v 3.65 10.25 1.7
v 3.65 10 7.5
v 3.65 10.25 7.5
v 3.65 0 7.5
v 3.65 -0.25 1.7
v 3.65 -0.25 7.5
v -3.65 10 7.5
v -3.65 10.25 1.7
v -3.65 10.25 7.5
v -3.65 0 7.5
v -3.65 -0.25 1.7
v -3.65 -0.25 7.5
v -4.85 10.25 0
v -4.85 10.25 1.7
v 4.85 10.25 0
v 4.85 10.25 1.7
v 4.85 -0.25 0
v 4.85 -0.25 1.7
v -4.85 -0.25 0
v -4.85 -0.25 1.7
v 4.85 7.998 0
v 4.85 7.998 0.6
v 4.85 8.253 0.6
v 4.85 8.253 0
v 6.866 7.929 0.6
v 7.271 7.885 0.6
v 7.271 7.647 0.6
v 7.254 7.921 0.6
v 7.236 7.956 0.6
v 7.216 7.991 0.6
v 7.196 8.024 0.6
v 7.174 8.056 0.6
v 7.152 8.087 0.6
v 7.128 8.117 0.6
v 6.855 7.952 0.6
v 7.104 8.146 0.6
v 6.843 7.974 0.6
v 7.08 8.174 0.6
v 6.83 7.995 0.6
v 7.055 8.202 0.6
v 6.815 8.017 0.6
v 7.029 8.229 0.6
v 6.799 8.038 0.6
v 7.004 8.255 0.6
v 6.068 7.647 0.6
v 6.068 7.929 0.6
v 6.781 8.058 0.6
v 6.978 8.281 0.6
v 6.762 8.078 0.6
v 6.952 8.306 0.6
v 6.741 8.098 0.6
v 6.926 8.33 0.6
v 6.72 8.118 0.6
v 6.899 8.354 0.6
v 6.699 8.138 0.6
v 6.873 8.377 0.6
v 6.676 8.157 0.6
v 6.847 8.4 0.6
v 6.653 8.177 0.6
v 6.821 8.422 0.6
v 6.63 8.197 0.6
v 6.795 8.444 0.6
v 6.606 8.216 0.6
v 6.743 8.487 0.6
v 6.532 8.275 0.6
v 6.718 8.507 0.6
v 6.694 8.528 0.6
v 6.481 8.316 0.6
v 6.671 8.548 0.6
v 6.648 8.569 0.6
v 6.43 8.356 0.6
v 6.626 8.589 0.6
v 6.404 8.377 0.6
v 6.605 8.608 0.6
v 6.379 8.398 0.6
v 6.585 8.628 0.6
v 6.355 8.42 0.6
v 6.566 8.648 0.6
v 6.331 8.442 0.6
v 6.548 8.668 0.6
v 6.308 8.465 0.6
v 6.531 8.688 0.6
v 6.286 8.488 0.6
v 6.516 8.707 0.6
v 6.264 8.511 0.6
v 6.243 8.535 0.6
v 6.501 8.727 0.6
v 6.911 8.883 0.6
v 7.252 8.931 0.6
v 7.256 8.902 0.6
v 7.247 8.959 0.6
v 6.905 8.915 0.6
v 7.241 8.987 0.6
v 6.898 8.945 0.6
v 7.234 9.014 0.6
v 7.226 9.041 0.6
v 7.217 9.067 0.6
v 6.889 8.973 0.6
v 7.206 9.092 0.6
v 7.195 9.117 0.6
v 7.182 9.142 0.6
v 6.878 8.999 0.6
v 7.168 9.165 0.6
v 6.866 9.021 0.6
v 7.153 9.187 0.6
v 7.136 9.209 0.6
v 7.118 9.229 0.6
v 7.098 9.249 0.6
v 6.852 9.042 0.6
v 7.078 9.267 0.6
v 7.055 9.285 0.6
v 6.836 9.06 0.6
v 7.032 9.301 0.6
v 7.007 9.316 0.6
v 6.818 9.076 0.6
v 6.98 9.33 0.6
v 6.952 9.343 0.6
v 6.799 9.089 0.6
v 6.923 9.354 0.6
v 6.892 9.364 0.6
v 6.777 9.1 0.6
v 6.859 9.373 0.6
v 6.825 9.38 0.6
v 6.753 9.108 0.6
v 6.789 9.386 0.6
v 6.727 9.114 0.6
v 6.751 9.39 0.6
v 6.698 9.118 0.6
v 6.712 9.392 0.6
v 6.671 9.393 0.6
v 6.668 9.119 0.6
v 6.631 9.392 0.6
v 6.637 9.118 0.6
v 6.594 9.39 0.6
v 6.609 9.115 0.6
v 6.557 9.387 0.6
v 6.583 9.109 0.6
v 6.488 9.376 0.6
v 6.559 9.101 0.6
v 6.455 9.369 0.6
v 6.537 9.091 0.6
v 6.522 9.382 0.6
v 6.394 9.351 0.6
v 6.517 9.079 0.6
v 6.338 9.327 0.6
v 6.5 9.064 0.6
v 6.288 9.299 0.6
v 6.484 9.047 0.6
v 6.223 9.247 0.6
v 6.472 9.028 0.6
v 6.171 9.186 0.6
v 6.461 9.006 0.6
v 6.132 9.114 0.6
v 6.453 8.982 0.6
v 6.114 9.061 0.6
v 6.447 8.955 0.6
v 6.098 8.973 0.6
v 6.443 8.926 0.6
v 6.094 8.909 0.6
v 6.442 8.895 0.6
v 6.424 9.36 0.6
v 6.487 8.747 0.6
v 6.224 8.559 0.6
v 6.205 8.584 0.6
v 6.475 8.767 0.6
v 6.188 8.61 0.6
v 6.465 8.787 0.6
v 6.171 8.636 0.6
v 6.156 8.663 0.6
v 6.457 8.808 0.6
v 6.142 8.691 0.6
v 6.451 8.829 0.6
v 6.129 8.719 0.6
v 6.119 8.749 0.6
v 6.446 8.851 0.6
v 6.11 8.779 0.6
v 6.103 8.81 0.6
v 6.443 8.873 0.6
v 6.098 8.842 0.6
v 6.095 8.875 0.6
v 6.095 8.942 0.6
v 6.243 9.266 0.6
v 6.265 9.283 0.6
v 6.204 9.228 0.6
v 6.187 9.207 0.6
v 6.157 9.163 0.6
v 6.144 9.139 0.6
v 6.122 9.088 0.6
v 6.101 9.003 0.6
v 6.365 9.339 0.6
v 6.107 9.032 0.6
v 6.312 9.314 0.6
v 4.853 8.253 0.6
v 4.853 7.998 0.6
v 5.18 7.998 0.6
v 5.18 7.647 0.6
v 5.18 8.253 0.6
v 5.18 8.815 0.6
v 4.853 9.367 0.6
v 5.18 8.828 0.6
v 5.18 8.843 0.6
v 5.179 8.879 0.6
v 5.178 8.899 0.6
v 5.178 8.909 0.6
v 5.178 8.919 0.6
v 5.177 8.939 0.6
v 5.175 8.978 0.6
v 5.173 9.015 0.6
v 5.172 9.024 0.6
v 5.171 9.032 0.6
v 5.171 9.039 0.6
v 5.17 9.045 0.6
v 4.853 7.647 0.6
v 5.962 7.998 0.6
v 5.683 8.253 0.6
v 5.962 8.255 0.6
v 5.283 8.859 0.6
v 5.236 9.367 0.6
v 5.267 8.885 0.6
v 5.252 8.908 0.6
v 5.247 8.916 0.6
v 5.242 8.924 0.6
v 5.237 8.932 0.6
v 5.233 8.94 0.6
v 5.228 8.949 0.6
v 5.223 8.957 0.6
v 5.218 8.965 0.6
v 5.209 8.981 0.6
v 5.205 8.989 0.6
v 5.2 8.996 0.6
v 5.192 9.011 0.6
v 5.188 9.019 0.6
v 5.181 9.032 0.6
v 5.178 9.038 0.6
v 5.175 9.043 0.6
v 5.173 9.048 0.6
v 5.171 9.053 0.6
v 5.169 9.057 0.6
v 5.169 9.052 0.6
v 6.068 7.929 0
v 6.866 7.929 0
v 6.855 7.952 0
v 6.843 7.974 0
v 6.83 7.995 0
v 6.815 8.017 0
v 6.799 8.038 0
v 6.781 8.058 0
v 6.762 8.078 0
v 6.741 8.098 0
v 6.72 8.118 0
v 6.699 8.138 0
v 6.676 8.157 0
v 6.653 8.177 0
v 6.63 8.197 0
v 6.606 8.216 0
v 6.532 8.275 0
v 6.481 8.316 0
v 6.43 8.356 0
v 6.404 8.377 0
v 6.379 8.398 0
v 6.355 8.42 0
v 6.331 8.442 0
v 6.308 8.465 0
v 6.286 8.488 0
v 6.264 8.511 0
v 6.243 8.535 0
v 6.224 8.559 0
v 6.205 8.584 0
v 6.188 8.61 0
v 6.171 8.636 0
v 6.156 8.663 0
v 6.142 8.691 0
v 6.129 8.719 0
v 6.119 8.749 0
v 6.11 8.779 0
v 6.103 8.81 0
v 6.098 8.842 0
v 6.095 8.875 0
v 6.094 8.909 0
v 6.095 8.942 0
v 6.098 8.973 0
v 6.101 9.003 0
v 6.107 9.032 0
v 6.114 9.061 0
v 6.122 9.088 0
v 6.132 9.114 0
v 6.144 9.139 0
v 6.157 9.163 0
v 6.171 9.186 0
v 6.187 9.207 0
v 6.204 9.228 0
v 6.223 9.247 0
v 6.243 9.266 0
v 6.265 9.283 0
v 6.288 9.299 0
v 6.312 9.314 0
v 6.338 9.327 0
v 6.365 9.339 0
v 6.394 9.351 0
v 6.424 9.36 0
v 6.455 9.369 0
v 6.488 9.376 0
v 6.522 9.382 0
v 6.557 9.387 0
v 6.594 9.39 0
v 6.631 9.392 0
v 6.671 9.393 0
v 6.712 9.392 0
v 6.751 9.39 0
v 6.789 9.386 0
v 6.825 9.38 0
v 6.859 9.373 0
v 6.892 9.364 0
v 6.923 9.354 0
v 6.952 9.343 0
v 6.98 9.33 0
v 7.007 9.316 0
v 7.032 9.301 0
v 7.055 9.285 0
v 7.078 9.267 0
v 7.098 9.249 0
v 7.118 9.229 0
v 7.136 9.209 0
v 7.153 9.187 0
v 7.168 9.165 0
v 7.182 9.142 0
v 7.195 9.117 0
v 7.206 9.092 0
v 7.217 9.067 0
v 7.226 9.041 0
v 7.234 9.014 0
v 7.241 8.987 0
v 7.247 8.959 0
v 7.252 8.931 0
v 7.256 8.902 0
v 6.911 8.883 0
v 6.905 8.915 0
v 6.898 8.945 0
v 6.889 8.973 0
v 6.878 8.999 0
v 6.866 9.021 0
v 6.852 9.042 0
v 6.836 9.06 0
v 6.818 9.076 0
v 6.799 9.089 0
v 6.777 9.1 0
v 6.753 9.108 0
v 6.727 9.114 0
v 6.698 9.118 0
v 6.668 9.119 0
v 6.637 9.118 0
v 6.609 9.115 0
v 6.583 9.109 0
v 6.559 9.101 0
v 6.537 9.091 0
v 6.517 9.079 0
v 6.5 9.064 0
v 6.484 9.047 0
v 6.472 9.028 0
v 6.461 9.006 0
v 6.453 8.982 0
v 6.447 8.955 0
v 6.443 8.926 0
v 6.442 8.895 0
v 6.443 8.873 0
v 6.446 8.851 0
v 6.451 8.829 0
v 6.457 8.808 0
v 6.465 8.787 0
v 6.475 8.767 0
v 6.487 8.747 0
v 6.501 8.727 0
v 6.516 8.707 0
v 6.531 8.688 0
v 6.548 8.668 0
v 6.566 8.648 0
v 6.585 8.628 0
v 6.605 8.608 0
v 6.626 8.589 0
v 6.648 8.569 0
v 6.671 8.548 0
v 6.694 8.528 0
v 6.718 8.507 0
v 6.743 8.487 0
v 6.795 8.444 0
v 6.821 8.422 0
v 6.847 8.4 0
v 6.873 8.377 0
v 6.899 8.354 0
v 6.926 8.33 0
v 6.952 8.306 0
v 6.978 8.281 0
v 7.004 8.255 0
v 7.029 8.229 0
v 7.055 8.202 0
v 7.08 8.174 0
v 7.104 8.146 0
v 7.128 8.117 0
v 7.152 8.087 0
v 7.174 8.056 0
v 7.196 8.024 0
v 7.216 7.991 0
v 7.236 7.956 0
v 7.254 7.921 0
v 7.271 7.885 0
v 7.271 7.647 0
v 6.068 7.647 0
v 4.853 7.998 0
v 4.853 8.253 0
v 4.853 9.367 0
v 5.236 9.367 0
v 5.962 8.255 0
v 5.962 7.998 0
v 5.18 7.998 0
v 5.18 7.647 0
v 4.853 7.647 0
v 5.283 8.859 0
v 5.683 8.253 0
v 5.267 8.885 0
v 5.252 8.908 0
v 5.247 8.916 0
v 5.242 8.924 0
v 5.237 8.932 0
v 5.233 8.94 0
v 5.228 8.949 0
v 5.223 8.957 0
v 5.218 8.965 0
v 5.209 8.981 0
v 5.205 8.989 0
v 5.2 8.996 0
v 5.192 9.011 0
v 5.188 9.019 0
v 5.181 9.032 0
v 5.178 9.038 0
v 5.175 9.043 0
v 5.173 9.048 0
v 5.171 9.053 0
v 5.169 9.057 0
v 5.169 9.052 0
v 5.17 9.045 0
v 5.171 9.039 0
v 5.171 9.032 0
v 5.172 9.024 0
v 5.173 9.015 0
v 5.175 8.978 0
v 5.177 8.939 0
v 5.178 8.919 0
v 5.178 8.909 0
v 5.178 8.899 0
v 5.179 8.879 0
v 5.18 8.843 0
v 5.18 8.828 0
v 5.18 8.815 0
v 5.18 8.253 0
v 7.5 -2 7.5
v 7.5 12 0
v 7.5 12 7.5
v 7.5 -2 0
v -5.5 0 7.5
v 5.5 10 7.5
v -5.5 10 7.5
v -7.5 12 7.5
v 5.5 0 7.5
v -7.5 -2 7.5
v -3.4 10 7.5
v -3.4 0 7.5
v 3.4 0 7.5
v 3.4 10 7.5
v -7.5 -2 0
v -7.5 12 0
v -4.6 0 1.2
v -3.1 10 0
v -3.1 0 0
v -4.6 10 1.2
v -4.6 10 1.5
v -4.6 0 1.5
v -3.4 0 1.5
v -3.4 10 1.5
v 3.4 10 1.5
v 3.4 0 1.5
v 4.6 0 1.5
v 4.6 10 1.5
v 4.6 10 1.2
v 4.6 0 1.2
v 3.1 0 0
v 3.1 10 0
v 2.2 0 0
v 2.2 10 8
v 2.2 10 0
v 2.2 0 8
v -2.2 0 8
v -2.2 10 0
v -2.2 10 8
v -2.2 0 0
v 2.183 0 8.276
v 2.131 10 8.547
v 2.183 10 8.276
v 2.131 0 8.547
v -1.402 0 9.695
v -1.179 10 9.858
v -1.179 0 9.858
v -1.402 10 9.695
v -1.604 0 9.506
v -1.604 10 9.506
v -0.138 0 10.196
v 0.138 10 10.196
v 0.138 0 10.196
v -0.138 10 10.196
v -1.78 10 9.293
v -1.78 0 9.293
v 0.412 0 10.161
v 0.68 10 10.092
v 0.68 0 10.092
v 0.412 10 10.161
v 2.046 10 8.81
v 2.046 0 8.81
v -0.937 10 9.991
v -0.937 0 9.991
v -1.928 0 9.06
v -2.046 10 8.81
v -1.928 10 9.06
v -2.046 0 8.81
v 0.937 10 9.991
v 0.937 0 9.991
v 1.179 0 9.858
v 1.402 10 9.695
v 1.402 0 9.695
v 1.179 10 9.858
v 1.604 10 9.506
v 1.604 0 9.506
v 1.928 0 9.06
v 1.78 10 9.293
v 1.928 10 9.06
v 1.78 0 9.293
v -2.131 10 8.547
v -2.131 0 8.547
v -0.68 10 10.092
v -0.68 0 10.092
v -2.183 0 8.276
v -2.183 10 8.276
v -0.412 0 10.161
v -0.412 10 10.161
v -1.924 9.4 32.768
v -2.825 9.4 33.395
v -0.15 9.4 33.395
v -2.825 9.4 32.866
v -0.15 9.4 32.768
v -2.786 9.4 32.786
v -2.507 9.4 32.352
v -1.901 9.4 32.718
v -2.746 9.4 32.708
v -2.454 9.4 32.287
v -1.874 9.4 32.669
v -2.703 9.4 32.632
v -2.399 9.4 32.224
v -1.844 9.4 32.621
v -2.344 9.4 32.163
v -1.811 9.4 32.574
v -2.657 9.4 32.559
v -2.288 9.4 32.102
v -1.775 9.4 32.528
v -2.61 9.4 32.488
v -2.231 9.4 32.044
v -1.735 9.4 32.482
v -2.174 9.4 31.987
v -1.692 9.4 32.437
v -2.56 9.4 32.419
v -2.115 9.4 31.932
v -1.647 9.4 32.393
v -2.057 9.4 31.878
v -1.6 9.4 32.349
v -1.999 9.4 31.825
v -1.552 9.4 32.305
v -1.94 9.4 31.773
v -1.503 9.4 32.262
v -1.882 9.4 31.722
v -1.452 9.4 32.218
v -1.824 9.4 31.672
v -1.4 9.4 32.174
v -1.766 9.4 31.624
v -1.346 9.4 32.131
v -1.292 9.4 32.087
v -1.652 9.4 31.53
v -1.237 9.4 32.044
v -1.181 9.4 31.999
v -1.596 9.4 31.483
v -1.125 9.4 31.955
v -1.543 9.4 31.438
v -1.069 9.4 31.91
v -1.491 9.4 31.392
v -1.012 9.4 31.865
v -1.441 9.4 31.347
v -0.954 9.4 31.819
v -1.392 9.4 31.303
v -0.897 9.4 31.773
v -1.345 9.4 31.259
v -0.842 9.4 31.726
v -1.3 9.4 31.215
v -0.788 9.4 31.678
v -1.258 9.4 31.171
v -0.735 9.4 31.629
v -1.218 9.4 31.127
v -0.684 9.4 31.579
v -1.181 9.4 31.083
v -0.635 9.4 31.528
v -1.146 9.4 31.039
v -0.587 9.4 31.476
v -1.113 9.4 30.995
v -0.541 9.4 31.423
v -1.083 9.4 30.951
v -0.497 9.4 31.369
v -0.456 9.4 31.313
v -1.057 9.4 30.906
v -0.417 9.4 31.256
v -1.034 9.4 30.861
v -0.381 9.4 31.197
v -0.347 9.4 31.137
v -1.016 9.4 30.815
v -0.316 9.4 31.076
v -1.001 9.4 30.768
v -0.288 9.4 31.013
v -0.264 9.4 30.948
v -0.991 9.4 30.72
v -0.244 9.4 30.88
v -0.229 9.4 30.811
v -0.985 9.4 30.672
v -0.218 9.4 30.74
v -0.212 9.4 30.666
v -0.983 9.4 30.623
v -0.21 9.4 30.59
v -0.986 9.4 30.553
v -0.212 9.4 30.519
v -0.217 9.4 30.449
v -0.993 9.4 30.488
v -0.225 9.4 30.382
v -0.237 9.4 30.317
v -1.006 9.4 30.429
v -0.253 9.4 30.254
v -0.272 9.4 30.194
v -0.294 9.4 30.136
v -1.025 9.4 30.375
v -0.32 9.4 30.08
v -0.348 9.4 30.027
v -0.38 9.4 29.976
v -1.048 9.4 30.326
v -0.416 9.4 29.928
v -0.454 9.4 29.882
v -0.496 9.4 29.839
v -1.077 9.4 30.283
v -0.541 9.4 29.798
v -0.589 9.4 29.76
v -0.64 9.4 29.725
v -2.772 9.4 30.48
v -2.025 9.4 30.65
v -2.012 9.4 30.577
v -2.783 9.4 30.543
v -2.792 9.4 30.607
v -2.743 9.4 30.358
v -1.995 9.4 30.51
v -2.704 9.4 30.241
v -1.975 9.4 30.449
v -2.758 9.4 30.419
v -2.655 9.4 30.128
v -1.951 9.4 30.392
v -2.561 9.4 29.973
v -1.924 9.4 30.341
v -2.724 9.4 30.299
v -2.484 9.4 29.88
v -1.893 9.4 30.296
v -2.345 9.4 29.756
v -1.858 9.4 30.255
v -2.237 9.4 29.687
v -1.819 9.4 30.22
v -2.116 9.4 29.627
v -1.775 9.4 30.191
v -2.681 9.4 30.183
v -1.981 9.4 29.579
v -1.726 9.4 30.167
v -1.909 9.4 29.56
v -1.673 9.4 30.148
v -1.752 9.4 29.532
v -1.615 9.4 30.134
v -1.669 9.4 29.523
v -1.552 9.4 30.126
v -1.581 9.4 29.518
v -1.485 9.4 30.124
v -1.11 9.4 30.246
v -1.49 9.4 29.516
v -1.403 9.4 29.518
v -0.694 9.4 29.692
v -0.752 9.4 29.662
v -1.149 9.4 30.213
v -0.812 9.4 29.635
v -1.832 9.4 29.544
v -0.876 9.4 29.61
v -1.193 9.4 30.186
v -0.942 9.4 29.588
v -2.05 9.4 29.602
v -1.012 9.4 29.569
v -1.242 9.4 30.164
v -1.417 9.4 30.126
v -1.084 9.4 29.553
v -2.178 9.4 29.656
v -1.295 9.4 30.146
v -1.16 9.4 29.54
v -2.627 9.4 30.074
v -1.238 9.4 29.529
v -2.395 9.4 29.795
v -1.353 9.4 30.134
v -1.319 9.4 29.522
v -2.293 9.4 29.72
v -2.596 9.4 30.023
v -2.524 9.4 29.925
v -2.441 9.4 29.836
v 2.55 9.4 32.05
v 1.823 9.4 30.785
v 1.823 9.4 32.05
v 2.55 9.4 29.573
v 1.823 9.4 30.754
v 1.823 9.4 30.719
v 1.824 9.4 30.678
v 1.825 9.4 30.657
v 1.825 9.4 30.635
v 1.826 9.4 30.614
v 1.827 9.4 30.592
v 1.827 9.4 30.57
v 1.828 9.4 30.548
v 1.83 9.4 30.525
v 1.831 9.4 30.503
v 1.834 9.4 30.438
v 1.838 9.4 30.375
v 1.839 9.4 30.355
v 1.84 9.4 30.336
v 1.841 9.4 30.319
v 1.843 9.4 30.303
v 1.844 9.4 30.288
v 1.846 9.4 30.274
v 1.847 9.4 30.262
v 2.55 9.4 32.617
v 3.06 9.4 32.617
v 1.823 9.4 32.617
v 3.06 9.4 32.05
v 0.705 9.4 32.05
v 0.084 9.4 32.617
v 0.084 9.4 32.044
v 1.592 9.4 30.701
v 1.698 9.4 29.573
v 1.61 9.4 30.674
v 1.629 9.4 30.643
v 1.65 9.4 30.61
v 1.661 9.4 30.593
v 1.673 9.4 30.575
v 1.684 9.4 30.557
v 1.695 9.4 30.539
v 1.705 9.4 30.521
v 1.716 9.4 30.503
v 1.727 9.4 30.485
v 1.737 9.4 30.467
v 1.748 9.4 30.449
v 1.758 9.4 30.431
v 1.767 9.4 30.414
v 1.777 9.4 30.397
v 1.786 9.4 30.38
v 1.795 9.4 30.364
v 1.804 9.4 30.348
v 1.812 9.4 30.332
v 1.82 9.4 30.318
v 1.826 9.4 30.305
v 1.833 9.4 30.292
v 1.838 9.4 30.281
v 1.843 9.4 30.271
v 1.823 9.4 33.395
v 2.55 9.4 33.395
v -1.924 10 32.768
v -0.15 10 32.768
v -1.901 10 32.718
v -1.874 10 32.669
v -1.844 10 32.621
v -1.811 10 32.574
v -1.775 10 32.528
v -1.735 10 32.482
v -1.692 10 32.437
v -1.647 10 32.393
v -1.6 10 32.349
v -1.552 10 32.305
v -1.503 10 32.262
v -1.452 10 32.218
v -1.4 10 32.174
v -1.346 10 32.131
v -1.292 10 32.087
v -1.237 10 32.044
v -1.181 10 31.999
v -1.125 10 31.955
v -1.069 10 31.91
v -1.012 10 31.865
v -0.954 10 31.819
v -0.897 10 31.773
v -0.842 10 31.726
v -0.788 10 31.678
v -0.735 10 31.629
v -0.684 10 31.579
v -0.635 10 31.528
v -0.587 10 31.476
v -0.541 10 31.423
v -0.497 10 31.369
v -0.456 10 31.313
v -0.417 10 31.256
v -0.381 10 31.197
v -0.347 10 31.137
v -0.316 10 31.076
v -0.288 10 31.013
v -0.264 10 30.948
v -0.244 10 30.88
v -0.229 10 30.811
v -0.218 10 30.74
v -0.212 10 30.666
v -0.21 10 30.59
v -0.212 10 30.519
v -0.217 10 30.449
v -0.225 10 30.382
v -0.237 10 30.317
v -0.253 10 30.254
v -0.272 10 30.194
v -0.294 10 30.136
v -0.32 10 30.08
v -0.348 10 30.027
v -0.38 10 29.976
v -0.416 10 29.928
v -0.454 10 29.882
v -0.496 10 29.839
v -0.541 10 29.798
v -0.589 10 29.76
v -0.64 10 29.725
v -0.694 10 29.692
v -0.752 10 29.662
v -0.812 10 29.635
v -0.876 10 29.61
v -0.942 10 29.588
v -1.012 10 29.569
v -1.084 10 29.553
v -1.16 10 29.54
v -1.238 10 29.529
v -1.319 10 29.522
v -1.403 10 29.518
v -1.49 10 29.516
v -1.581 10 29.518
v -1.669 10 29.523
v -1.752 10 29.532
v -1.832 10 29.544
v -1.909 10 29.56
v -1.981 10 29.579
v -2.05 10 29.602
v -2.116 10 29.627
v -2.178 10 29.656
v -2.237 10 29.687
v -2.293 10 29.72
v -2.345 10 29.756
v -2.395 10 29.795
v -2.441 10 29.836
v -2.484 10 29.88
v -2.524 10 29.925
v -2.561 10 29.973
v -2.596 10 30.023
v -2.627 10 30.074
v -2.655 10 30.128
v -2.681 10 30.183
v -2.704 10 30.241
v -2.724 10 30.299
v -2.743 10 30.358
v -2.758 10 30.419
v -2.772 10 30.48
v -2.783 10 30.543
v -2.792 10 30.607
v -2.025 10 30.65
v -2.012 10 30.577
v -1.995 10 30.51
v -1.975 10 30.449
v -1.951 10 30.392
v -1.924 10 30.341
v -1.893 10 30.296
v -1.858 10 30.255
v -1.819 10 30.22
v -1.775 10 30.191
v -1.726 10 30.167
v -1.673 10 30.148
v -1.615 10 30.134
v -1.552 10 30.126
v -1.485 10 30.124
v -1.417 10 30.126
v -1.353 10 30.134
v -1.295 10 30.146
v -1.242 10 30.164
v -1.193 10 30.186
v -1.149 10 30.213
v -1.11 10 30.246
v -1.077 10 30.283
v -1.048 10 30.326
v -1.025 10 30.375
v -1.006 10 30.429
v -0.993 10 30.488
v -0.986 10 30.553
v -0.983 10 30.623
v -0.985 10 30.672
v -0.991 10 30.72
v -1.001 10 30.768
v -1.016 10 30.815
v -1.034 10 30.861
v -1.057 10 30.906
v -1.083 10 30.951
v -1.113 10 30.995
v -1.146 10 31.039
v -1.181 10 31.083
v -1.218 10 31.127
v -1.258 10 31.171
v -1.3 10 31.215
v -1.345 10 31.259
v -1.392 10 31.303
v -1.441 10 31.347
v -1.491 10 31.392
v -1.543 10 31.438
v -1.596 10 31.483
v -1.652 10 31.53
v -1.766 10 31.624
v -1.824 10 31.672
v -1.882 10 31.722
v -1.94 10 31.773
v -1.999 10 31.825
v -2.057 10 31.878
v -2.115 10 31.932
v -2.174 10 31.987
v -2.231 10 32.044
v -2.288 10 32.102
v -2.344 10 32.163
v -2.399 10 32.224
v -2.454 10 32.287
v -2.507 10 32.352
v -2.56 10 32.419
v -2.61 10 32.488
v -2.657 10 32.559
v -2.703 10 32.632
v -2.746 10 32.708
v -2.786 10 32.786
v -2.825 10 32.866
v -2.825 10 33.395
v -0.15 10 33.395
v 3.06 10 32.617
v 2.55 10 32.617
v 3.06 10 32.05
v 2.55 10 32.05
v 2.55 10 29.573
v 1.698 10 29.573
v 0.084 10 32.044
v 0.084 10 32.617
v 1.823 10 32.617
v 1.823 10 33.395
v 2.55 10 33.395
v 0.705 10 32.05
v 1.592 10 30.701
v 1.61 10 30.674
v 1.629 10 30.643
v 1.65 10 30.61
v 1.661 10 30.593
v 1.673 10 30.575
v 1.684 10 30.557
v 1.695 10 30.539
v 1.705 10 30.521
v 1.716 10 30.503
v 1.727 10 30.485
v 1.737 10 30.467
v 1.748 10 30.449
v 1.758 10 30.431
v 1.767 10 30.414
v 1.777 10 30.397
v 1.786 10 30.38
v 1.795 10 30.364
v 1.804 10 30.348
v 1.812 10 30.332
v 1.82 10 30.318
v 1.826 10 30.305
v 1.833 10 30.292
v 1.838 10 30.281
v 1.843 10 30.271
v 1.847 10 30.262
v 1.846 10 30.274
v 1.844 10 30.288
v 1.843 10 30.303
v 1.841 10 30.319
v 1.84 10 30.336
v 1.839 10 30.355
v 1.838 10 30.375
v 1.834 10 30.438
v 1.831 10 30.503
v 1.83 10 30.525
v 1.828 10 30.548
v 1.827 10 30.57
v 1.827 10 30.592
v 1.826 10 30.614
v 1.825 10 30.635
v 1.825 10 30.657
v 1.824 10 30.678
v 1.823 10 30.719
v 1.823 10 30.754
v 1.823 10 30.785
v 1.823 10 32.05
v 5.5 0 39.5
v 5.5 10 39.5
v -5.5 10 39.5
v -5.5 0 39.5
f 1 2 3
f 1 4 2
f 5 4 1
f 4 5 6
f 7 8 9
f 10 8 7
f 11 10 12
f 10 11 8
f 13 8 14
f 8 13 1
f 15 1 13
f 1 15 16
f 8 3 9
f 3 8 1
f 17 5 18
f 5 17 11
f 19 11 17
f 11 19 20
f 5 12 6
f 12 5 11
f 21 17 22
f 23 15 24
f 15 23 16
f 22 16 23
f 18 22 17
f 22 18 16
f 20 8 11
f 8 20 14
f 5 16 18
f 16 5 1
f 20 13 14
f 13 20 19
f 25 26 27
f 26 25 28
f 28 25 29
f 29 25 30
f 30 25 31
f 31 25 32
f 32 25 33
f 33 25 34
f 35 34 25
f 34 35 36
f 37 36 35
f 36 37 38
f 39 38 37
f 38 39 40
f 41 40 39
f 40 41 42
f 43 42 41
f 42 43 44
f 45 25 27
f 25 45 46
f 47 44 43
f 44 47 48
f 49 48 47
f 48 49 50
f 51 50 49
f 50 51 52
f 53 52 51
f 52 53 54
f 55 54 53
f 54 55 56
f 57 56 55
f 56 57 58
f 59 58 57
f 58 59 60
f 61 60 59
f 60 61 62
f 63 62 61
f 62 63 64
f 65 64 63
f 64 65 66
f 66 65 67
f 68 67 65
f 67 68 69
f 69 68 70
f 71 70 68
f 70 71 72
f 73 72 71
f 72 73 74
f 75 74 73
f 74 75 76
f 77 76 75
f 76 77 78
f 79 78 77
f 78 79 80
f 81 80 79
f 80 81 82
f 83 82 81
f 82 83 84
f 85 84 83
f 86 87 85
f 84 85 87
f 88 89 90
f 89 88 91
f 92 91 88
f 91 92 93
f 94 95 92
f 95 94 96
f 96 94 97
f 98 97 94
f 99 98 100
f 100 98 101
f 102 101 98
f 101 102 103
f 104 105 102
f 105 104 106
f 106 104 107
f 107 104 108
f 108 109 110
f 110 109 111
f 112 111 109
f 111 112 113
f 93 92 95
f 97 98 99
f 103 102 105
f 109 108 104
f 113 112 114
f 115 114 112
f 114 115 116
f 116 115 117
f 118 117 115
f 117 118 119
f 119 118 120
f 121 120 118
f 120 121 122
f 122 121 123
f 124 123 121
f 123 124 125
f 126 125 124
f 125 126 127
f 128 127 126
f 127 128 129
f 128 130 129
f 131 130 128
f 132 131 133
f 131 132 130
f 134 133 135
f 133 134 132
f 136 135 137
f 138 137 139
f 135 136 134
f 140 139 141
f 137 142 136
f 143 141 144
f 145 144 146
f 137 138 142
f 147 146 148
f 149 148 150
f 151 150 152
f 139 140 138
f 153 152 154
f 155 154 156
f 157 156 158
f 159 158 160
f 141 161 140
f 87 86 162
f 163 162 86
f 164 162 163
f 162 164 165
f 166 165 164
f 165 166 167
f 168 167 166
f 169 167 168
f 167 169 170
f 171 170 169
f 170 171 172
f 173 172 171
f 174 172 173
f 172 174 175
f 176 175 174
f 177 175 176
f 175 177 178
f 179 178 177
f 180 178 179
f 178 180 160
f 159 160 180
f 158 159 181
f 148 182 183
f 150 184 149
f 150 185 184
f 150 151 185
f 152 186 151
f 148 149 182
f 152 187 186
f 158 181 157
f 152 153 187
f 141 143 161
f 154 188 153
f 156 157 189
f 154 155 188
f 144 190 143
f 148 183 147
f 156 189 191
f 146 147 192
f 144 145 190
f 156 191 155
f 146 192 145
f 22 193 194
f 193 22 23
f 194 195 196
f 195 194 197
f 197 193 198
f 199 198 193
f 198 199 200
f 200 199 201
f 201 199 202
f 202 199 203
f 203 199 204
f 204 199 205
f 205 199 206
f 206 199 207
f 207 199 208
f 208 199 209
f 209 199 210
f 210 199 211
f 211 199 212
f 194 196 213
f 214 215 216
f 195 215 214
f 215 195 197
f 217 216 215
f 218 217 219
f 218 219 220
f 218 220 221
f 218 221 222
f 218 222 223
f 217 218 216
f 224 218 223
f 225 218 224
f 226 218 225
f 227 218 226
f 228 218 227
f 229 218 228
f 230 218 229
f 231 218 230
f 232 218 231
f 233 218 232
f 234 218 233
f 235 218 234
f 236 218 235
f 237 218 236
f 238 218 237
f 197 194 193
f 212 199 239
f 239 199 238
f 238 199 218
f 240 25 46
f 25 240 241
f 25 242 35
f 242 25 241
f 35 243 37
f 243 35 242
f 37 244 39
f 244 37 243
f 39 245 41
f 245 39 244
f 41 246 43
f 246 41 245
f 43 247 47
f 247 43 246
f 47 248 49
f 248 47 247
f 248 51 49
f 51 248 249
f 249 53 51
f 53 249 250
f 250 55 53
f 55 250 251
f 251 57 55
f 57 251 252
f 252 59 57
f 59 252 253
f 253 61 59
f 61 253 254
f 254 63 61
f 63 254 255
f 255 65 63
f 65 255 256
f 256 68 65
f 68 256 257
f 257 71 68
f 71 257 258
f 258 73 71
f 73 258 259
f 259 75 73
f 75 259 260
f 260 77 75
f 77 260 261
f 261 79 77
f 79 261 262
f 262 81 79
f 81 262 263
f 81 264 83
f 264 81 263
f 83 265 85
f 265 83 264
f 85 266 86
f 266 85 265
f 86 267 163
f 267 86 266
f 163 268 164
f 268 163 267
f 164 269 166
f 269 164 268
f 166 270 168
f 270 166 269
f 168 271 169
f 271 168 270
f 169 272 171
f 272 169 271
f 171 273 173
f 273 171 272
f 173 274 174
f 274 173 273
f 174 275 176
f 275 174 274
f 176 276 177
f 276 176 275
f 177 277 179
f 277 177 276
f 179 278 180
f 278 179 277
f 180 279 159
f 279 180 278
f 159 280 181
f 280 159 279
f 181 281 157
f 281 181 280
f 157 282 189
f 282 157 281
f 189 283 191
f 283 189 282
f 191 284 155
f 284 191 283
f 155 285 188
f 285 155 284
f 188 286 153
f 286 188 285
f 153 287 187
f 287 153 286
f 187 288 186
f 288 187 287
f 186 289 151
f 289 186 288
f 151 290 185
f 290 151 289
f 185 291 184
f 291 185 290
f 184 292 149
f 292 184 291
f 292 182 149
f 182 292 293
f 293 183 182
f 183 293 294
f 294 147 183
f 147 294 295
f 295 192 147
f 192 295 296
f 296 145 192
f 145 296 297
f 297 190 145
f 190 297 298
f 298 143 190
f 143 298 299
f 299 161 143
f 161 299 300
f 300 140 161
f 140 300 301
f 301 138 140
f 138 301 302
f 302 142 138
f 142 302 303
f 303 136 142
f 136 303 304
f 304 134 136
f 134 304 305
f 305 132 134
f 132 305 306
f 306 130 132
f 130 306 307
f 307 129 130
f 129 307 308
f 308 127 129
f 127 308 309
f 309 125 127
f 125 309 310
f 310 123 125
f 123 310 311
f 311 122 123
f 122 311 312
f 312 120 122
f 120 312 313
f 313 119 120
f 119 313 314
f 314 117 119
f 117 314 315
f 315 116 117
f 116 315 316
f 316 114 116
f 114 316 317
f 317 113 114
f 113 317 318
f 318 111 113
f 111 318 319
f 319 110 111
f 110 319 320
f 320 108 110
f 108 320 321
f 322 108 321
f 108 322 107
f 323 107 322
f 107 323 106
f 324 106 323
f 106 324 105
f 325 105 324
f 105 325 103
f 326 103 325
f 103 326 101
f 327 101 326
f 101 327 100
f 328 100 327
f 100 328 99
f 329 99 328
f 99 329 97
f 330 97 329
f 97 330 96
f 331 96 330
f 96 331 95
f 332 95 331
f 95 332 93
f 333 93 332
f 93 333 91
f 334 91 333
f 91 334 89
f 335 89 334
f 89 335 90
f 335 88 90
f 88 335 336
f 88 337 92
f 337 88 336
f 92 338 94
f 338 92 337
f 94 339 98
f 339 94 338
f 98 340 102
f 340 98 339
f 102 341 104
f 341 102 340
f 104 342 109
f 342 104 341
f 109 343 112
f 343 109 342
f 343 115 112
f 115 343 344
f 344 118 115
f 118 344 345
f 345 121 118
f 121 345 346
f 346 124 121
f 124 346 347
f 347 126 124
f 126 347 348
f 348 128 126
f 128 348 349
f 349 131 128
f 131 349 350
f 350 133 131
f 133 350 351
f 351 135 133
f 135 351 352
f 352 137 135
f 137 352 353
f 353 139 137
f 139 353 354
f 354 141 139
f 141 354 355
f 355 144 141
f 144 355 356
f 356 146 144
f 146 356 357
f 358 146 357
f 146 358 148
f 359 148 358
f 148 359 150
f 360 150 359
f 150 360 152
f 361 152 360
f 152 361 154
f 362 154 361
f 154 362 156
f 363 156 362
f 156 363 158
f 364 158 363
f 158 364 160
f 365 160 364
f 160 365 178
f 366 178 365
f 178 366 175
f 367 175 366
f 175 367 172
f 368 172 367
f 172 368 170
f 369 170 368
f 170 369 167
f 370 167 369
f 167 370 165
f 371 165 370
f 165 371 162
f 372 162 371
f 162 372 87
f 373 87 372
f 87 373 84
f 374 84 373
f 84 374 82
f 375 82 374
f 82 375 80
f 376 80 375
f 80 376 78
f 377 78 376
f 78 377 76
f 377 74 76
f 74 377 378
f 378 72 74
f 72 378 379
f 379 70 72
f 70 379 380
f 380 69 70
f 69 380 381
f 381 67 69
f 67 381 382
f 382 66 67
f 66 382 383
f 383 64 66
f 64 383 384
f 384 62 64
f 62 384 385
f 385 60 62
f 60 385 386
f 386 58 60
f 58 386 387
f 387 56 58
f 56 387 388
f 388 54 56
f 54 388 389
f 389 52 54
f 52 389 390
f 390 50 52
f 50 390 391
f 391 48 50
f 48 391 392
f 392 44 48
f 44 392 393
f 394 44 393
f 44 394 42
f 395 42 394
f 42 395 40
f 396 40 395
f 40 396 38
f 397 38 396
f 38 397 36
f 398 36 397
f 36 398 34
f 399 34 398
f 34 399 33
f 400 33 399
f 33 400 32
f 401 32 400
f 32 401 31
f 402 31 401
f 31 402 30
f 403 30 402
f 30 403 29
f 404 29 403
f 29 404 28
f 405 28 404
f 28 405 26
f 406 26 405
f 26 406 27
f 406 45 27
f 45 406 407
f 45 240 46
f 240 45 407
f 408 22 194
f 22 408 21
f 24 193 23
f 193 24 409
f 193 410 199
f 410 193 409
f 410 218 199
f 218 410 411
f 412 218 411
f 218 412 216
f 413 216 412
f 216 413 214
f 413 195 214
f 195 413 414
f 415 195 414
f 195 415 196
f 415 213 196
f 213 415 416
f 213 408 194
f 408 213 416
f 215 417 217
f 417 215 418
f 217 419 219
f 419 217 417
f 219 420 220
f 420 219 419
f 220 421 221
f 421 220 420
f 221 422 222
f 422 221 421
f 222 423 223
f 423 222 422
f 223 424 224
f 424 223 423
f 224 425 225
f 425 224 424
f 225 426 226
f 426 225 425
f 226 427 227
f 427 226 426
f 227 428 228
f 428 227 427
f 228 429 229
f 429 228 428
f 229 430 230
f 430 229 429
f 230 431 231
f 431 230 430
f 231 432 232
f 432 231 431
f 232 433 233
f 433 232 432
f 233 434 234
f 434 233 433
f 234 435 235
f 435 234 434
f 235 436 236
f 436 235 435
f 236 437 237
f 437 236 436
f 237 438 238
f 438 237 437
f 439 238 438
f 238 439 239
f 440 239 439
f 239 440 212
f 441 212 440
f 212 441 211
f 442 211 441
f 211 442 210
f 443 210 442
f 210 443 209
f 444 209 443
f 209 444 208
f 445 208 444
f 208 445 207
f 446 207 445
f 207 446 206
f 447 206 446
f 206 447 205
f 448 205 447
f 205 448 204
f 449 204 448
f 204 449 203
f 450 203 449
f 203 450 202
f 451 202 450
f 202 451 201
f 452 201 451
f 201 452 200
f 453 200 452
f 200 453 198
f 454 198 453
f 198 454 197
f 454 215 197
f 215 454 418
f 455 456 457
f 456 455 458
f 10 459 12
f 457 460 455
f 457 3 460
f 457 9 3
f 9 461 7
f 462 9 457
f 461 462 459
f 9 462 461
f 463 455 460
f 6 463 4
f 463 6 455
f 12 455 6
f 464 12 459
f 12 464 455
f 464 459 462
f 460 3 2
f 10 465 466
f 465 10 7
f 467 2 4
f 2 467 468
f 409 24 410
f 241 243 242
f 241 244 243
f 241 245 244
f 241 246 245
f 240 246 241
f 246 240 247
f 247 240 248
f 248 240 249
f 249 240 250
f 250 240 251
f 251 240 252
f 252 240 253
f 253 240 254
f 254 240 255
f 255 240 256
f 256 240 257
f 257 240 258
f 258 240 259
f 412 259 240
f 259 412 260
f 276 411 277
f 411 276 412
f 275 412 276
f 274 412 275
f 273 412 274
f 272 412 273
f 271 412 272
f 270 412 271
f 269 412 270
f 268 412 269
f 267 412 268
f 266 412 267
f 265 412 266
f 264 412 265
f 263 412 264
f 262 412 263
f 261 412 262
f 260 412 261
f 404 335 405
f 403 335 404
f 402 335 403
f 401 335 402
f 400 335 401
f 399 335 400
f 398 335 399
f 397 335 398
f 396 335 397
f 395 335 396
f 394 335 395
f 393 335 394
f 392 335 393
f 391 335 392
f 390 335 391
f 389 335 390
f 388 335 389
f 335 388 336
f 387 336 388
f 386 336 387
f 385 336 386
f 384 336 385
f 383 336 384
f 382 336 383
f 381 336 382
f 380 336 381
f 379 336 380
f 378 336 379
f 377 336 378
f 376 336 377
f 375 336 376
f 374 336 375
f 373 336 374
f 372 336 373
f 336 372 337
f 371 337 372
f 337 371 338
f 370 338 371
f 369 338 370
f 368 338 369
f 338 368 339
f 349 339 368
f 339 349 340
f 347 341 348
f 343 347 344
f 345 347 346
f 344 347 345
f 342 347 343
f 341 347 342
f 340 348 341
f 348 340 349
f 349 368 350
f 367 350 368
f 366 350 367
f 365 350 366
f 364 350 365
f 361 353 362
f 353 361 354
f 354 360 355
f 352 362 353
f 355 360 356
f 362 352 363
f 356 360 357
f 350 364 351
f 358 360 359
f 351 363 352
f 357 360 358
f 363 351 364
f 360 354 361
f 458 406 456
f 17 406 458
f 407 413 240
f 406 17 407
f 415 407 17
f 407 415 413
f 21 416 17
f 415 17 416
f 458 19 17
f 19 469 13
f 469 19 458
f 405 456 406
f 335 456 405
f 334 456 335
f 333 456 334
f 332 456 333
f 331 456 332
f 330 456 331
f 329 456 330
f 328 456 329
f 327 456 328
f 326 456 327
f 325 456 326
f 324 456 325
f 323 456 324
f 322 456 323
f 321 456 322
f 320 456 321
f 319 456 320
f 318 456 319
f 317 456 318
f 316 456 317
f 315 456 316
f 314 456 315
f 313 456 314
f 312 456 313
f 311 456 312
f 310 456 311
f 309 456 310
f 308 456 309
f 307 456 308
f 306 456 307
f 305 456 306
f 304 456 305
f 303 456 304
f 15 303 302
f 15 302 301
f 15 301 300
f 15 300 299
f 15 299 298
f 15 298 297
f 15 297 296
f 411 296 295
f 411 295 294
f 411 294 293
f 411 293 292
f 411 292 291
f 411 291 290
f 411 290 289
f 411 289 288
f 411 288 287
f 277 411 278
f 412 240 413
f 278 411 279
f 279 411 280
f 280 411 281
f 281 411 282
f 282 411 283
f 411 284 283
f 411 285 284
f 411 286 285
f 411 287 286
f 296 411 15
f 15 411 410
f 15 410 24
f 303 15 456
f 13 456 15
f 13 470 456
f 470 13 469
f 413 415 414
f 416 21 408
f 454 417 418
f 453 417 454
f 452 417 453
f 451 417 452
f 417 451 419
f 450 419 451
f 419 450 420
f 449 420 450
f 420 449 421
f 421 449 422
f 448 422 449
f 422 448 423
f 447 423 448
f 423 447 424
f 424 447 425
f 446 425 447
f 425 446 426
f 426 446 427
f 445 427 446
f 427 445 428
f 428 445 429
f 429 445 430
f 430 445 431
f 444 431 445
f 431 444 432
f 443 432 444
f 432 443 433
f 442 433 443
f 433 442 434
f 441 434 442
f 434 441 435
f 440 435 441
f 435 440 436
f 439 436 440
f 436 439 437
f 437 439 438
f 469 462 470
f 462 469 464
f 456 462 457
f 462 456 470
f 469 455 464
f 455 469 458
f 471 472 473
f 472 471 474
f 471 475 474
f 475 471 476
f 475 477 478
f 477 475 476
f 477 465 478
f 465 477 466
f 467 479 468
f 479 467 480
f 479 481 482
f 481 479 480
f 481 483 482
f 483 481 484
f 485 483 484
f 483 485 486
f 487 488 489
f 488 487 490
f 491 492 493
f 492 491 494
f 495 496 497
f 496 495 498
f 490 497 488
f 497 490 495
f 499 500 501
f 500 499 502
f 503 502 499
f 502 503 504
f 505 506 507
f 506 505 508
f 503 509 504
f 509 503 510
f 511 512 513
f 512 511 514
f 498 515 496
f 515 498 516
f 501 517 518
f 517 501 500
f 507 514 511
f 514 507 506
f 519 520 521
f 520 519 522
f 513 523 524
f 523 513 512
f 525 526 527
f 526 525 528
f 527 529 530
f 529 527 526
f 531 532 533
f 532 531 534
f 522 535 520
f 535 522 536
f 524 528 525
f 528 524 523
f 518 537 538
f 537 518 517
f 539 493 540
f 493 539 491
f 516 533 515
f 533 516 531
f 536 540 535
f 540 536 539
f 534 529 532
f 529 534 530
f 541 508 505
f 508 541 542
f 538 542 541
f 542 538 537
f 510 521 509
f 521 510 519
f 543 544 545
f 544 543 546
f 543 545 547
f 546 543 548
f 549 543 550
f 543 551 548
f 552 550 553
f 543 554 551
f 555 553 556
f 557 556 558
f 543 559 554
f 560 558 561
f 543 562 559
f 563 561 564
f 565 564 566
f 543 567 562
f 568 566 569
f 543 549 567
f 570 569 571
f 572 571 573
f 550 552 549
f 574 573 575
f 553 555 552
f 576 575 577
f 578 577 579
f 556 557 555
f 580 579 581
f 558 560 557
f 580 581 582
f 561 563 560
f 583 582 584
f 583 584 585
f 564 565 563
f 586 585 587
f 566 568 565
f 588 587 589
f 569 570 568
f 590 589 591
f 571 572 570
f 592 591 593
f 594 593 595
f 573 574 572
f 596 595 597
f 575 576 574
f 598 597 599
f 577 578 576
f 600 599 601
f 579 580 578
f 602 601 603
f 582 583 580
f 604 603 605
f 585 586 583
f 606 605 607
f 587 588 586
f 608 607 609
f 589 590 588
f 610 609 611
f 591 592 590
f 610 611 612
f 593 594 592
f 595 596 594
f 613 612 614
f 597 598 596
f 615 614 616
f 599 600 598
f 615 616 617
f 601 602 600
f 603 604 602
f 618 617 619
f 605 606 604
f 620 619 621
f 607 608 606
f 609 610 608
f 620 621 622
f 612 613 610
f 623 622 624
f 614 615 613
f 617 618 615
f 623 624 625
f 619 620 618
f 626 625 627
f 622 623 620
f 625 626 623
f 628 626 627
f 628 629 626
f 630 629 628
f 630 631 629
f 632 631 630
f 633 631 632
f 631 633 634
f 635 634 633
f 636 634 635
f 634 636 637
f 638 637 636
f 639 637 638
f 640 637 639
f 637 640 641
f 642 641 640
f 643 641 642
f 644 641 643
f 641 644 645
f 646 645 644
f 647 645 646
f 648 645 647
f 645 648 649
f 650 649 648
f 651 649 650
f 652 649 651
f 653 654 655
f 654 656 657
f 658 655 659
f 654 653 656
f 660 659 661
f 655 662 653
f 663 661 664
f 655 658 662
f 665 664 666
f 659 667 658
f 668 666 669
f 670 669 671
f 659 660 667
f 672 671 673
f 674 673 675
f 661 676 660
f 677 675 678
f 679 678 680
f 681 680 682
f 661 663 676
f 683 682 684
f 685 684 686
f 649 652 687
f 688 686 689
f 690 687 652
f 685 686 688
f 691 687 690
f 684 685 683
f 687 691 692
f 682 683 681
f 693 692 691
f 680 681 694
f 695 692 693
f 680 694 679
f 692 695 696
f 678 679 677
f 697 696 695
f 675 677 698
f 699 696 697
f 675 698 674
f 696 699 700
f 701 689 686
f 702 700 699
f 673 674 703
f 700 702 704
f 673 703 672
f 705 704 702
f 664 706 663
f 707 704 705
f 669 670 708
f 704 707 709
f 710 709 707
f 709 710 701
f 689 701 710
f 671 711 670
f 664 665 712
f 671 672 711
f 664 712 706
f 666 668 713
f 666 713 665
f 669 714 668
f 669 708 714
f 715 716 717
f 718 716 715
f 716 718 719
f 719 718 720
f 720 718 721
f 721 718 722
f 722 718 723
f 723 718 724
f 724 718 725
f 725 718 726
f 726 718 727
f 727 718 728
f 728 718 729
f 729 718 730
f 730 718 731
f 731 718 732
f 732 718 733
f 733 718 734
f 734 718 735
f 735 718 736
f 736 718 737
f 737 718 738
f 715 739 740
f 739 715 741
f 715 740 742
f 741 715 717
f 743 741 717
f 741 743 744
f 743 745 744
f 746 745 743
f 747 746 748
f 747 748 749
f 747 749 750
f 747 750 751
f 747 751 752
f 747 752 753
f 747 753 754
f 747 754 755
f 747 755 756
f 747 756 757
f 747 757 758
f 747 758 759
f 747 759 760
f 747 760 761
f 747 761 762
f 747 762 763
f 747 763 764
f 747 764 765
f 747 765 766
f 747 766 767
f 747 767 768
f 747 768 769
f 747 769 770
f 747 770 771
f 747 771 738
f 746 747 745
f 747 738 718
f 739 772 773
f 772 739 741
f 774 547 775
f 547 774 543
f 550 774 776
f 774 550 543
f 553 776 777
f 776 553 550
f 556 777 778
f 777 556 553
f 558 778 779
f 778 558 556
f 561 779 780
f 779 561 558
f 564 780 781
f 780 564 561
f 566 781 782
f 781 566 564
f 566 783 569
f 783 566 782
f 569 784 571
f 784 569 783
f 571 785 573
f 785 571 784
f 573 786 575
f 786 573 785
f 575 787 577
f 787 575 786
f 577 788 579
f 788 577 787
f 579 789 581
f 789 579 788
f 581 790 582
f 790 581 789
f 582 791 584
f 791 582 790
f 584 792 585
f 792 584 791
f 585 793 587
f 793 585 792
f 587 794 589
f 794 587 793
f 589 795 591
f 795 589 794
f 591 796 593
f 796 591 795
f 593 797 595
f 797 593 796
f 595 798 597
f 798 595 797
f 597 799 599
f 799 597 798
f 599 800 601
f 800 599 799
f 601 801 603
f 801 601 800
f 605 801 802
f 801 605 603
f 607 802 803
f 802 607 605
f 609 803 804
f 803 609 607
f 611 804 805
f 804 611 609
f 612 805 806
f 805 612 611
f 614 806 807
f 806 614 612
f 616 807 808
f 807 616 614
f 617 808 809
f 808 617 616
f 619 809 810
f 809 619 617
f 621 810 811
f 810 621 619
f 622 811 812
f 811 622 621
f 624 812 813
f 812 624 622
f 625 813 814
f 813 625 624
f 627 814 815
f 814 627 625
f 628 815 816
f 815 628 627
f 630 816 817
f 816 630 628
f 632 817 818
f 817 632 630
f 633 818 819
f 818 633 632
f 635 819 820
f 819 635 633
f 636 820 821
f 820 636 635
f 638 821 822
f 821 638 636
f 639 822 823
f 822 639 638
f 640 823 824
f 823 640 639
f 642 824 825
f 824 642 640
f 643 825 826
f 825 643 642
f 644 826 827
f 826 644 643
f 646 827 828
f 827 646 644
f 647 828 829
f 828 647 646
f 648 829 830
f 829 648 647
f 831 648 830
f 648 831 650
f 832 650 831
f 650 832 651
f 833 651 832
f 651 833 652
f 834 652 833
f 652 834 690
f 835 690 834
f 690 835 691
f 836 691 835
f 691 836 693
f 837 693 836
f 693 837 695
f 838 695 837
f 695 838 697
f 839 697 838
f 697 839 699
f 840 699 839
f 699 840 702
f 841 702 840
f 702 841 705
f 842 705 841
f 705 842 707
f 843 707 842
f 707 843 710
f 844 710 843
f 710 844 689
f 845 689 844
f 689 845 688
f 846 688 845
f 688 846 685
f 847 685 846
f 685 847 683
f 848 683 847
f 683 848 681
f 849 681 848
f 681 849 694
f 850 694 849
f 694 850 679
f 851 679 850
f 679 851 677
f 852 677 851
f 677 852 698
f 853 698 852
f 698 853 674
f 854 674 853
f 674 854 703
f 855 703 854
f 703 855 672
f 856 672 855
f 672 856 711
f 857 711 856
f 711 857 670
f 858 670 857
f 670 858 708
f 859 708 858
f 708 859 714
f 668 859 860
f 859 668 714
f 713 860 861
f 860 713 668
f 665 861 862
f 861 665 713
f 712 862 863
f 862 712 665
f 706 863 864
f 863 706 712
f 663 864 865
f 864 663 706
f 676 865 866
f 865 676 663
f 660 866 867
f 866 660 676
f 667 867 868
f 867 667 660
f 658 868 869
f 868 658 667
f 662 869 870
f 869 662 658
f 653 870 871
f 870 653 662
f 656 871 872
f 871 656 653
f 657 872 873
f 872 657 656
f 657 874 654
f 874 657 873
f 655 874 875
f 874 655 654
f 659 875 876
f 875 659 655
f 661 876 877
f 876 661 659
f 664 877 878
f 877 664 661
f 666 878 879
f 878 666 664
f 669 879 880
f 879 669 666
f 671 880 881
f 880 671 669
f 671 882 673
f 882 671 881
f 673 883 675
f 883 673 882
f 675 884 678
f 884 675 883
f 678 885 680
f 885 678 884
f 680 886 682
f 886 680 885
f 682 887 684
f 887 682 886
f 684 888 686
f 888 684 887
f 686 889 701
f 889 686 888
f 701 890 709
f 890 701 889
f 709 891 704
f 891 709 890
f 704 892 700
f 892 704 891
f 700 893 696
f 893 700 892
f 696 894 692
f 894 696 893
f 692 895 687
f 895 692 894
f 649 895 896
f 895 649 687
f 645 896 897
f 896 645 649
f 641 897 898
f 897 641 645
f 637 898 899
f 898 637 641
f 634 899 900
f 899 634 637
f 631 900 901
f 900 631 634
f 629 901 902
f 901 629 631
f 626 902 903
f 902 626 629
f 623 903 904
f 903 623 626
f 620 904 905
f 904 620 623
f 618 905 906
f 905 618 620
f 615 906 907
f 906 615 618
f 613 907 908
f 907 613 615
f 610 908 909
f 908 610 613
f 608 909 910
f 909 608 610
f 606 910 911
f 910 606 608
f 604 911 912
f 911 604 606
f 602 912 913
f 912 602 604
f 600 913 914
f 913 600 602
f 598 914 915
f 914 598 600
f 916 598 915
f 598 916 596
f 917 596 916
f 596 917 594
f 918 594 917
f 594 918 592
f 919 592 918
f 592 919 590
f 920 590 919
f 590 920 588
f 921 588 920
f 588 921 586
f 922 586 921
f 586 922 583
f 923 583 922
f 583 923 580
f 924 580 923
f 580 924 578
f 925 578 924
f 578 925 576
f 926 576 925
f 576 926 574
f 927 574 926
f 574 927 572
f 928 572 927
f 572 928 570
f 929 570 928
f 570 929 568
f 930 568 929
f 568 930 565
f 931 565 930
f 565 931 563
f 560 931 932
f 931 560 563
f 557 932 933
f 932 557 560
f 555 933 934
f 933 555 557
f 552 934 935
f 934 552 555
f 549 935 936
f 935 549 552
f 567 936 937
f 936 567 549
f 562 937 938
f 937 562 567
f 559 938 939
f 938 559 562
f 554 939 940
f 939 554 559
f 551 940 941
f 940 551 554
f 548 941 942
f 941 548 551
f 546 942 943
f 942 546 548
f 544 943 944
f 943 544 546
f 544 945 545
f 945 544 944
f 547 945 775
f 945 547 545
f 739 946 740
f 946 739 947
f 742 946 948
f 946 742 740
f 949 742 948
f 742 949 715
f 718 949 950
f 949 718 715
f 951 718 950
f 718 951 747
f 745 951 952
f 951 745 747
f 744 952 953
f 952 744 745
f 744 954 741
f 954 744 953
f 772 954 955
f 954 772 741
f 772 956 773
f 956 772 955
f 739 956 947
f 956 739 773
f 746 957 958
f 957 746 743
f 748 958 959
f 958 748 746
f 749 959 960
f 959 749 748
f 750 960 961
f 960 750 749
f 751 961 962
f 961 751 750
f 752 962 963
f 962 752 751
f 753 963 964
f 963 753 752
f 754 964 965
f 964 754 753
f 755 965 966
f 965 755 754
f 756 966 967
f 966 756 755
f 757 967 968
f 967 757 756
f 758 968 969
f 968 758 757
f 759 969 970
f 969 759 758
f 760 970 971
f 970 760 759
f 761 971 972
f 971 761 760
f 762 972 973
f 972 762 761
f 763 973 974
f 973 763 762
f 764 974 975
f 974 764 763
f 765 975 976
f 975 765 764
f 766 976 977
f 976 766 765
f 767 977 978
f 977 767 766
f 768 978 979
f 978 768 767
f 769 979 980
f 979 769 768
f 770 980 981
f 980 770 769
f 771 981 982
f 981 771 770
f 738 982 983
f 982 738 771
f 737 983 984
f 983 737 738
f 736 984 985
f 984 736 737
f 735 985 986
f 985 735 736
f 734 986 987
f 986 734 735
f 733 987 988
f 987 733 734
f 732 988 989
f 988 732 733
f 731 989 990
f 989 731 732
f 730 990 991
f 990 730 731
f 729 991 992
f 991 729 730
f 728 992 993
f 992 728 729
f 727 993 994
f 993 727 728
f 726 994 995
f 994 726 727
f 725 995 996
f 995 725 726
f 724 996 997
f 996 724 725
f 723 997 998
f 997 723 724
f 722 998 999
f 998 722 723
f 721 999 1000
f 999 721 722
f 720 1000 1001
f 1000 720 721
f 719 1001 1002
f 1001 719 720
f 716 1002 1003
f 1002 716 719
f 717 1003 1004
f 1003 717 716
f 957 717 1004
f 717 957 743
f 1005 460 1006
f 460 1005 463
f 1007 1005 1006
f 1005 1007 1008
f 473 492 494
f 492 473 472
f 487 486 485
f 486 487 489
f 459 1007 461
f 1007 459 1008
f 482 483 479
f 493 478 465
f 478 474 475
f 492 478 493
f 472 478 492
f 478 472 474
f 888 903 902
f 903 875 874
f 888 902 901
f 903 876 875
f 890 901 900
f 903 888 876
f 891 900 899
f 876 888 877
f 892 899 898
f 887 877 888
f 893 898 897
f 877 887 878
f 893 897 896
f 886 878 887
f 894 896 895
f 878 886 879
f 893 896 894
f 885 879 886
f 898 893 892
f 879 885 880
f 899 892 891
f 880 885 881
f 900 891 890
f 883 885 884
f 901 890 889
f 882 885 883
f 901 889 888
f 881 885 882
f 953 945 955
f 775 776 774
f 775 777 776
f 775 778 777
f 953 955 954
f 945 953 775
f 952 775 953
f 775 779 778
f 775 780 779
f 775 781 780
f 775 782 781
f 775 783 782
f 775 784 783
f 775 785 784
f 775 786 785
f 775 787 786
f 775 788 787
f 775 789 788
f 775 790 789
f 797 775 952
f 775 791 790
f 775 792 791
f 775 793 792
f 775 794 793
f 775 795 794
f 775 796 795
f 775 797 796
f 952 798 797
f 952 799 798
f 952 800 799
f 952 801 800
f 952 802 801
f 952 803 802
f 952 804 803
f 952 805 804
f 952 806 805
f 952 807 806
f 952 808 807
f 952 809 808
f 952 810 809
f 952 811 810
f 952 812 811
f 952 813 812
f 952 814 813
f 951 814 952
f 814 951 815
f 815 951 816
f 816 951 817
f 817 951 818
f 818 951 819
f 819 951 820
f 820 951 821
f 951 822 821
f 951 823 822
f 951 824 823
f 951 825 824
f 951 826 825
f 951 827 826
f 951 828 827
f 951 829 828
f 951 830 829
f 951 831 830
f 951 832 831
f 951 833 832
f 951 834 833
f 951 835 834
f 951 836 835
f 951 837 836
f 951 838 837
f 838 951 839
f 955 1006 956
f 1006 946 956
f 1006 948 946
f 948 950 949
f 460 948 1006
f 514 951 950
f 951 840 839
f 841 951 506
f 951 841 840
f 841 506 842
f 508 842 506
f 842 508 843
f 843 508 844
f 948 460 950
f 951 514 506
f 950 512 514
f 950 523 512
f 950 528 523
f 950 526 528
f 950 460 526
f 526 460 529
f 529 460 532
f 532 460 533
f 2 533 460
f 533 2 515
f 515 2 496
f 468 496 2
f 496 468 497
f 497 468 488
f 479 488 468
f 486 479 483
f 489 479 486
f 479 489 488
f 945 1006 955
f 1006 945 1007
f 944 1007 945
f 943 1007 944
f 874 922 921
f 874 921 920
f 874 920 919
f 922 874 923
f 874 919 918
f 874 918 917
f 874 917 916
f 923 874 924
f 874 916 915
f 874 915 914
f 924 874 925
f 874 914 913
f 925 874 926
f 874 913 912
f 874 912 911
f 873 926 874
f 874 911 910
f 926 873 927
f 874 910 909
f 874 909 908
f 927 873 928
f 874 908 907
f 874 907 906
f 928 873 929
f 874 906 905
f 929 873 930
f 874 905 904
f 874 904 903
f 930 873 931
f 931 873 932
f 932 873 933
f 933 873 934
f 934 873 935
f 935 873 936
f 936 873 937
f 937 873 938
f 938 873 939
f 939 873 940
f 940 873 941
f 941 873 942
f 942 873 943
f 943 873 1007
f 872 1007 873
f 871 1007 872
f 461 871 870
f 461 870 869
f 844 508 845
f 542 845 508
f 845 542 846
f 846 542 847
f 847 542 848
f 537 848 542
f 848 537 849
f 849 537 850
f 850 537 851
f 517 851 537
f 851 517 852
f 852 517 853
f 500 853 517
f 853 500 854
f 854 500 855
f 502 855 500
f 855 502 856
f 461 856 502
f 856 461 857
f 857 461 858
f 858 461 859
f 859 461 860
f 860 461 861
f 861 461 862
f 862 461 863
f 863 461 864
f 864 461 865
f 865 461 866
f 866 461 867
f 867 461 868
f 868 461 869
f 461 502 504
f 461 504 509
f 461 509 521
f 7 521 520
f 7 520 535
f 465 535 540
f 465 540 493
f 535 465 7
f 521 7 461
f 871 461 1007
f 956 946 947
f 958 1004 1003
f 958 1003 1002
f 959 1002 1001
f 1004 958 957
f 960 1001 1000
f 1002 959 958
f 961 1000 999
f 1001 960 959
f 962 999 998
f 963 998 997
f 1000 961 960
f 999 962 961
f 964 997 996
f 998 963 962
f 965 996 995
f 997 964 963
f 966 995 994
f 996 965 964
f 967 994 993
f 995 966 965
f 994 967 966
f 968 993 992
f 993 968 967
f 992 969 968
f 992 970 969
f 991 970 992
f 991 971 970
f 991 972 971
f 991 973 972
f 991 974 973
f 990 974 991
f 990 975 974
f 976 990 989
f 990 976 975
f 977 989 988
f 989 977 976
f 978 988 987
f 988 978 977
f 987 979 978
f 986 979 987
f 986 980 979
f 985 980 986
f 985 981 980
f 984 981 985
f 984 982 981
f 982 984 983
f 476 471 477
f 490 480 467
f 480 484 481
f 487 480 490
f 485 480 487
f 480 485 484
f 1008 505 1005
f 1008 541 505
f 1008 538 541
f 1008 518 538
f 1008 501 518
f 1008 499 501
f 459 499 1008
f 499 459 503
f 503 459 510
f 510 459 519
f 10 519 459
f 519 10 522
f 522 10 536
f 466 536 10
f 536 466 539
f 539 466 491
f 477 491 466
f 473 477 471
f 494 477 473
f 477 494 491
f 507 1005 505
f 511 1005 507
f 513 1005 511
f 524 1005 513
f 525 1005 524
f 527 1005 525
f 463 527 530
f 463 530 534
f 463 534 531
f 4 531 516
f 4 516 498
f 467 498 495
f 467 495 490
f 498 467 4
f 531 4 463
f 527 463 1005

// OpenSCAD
$fn = 50;

difference() {
	union() {
		translate(v = [0, 0, 0]) {
			rotate(a = [0, 0, 0]) {
				difference() {
					union() {
						translate(v = [-7.5, -2.0, 0]) {
							cube(size = [15.0, 14.0, 7.5]);
						}
					}
					union() {
						translate(v = [-3.65, -0.25, -0.1]) {
							cube(size = [7.3, 10.5, 7.7]);
						}
						translate(v = [-4.85, -0.25, -0.1]) {
							cube(size = [9.7, 10.5, 1.8]);
						}
						translate(v = [6, 8.5, 0.6]) {
							rotate(a = [0, 180, 0]) {
								linear_extrude(height = 0.7) {
									text(font = "Arial:style=Bold", halign = "center", size = 1.8, text = "24", valign = "center");
								}
							}
						}
					}
				}
			}
		}
		translate(v = [0, 0, 7.5]) {
			rotate(a = [0, 0, 0]) {
				difference() {
					union() {
						translate(v = [-5.5, 0, -7.5]) {
							cube(size = [11.0, 10.0, 39.5]);
						}
					}
					union() {
						translate(v = [0, 10.1, 0]) {
							rotate(a = [90, 0, 0]) {
								linear_extrude(height = 10.2) {
									polygon(points = [[-3.1, -7.6], [-3.1, -7.5], [-4.6, -6.3], [-4.6, -6.0], [-3.4, -6.0], [-3.4, 0], [-5.6, 0], [-5.6, -7.6]]);
								}
							}
						}
						translate(v = [0, 10.1, 0]) {
							rotate(a = [90, 0, 0]) {
								linear_extrude(height = 10.2) {
									polygon(points = [[3.1, -7.6], [3.1, -7.5], [4.6, -6.3], [4.6, -6.0], [3.4, -6.0], [3.4, 0], [5.6, 0], [5.6, -7.6]]);
								}
							}
						}
						translate(v = [-2.2, -0.1, -7.6]) {
							cube(size = [4.4, 10.2, 8.1]);
						}
						translate(v = [0, 10.1, 0.5]) {
							rotate(a = [90, 0, 0]) {
								cylinder(h = 10.2, r = 2.2);
							}
						}
						translate(v = [0, 9.4, 24.0]) {
							rotate(a = [-90, 0, 0]) {
								linear_extrude(height = 0.7) {
									text(font = "Arial:style=Bold", halign = "center", size = 4.0, text = "24", valign = "center");
								}
							}
						}
					}
				}
			}
		}
	}
	union();
}
